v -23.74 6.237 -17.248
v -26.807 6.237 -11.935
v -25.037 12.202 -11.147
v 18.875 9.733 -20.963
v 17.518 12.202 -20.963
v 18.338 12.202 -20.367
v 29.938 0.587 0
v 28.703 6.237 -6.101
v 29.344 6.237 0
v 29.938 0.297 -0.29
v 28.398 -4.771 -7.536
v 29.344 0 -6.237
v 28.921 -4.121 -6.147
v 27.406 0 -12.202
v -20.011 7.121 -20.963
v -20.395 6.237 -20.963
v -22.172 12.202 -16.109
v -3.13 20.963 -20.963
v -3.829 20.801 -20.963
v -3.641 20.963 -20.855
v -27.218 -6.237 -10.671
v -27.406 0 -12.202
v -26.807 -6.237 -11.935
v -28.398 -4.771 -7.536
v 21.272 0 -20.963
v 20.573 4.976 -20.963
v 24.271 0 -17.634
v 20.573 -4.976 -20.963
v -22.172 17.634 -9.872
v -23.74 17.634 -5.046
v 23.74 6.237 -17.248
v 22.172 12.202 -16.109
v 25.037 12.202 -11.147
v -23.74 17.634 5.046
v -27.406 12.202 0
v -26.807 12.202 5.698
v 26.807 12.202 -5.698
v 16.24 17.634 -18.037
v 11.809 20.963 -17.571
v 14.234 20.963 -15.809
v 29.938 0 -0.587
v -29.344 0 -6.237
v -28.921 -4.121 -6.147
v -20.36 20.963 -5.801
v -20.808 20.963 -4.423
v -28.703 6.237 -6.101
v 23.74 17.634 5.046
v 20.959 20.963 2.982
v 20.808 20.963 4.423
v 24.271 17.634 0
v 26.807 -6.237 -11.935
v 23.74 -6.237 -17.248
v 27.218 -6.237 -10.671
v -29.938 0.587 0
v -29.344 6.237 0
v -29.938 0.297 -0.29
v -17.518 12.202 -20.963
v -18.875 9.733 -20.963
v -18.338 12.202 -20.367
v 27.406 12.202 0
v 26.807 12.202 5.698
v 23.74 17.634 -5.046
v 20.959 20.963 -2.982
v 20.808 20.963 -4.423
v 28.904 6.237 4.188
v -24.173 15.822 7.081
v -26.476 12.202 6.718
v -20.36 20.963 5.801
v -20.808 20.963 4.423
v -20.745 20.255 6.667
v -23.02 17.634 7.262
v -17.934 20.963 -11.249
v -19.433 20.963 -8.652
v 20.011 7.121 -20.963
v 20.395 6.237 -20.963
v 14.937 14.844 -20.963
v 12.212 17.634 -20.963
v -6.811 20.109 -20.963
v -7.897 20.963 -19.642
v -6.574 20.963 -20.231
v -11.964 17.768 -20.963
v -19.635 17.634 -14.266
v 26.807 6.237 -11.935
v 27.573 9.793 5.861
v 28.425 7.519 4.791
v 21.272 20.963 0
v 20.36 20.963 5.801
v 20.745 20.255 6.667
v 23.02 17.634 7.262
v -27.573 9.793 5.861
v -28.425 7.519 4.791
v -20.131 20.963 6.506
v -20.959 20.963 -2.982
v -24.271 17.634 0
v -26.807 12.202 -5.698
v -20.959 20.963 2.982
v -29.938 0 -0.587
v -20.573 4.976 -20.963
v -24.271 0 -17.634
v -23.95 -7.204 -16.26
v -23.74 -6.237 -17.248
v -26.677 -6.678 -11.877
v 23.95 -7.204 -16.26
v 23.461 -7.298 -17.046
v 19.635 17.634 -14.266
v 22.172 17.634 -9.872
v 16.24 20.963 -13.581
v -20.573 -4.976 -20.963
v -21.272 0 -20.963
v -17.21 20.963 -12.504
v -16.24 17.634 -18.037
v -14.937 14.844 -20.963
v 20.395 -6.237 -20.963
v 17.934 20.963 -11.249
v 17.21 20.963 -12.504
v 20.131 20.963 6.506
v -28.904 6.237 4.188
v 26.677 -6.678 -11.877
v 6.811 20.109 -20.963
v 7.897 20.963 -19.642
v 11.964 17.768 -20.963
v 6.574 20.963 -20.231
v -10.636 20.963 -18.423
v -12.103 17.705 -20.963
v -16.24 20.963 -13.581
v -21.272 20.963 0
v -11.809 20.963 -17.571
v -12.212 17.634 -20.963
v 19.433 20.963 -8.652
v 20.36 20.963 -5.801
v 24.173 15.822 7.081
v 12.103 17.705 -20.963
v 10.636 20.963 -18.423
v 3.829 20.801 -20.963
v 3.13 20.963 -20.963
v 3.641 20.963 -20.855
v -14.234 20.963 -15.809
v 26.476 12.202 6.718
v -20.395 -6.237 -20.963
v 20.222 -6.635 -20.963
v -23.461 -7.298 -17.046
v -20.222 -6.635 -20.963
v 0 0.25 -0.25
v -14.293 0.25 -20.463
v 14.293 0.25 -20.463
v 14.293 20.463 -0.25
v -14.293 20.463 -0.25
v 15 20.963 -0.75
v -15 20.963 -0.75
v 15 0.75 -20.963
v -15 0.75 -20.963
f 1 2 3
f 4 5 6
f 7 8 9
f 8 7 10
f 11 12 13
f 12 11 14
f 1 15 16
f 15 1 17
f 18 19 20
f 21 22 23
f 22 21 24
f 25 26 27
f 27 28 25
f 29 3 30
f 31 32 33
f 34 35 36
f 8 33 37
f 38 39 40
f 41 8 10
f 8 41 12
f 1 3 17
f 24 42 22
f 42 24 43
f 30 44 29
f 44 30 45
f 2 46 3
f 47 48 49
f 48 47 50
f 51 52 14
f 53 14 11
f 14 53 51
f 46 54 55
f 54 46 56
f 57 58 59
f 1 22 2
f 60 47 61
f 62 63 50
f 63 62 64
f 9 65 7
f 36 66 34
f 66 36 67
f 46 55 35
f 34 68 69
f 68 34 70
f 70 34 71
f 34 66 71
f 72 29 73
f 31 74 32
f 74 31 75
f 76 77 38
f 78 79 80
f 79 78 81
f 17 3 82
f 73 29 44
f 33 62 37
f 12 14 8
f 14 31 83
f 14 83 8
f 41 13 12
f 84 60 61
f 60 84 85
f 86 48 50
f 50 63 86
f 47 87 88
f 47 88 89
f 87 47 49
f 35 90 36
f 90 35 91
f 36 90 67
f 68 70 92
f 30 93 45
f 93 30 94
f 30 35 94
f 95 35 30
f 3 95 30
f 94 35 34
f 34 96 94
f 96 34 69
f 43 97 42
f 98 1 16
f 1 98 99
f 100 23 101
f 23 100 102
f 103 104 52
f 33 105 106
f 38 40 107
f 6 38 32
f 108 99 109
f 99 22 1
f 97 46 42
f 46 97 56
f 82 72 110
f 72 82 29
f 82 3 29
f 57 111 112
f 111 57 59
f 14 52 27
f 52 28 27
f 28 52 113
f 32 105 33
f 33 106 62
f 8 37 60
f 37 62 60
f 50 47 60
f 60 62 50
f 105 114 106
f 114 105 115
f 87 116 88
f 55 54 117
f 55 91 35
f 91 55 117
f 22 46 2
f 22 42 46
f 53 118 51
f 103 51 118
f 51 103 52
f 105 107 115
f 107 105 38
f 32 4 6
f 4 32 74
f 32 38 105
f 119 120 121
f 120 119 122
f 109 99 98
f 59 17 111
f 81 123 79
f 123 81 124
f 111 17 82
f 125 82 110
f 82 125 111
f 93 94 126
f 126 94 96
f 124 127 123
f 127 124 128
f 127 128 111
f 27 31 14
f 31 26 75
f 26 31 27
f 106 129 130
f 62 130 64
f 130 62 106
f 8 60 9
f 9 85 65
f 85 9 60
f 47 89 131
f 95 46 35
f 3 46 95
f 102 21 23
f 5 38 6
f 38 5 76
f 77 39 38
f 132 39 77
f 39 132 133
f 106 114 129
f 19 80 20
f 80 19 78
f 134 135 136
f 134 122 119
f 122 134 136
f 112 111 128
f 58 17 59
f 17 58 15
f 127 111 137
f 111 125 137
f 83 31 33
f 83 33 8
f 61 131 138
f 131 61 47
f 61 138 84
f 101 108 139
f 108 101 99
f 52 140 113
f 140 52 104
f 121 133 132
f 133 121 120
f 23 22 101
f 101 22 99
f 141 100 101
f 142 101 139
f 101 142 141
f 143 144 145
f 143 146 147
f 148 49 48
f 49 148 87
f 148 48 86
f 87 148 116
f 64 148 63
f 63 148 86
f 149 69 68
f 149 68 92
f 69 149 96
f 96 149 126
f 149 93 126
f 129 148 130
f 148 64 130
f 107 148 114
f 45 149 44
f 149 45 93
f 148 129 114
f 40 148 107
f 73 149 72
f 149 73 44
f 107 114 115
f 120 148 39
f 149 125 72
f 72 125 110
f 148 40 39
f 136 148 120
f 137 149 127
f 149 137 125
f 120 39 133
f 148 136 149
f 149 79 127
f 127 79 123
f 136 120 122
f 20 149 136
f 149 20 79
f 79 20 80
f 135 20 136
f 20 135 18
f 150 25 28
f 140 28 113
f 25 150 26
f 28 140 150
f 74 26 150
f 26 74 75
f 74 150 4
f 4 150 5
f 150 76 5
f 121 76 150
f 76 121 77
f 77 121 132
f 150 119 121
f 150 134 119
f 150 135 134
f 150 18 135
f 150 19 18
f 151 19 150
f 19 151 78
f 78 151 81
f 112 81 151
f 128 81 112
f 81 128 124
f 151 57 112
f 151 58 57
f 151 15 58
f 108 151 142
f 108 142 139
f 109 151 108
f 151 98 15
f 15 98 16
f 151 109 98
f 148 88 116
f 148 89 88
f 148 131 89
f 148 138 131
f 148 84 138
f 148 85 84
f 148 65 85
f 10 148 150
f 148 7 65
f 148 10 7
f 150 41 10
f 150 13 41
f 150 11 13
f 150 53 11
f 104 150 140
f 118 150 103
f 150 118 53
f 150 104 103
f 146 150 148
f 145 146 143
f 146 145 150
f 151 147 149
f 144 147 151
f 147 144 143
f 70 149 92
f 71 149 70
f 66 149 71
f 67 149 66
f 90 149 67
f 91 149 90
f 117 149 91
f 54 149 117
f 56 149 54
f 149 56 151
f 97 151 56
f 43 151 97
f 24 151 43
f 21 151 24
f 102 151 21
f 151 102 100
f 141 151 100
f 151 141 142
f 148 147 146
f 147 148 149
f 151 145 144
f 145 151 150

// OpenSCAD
// sphere puzzle 2 (new tolerance)

R=30; // radius of sphere
tol=0.5;// tolerance to allow looser fit
x=R*cos(45);

rotate([-90,0,])
difference(){
	sphere(r=R);
	translate([0,0,-R])
		cube(size=[R,2*R,2*R+tol],center=true);
	translate([0,-R,0])
		cube(size=[R,2*R+tol,2*R],center=true);
	rotate([-45,0,0])
		translate([0,0,-2*R])
			cube(size=4*R,center=true);
	translate([0,0,R+x])
		cube(size=2*R+tol,center=true);
	translate([0,R+x,0])
		cube(size=2*R+tol,center=true);
	translate([R/2,0,0])
		rotate([-45,0,0])rotate([0,45,0])
			cube(size=[x+tol,2*R,x+tol],center=true);
	translate([-R/2,0,0])
		rotate([-45,0,0])rotate([0,45,0])
			cube(size=[x+tol,2*R,x+tol],center=true);
	translate([0,-x+2*tol,0])
		rotate([45,0,0])translate([0,0,R/2])
			cube(size=[R,2*R,R],center=true);
	translate([0,0,-x+2*tol])
		rotate([45,0,0])translate([0,0,-R/2])
			cube(size=[R,2*R,R],center=true);
}
